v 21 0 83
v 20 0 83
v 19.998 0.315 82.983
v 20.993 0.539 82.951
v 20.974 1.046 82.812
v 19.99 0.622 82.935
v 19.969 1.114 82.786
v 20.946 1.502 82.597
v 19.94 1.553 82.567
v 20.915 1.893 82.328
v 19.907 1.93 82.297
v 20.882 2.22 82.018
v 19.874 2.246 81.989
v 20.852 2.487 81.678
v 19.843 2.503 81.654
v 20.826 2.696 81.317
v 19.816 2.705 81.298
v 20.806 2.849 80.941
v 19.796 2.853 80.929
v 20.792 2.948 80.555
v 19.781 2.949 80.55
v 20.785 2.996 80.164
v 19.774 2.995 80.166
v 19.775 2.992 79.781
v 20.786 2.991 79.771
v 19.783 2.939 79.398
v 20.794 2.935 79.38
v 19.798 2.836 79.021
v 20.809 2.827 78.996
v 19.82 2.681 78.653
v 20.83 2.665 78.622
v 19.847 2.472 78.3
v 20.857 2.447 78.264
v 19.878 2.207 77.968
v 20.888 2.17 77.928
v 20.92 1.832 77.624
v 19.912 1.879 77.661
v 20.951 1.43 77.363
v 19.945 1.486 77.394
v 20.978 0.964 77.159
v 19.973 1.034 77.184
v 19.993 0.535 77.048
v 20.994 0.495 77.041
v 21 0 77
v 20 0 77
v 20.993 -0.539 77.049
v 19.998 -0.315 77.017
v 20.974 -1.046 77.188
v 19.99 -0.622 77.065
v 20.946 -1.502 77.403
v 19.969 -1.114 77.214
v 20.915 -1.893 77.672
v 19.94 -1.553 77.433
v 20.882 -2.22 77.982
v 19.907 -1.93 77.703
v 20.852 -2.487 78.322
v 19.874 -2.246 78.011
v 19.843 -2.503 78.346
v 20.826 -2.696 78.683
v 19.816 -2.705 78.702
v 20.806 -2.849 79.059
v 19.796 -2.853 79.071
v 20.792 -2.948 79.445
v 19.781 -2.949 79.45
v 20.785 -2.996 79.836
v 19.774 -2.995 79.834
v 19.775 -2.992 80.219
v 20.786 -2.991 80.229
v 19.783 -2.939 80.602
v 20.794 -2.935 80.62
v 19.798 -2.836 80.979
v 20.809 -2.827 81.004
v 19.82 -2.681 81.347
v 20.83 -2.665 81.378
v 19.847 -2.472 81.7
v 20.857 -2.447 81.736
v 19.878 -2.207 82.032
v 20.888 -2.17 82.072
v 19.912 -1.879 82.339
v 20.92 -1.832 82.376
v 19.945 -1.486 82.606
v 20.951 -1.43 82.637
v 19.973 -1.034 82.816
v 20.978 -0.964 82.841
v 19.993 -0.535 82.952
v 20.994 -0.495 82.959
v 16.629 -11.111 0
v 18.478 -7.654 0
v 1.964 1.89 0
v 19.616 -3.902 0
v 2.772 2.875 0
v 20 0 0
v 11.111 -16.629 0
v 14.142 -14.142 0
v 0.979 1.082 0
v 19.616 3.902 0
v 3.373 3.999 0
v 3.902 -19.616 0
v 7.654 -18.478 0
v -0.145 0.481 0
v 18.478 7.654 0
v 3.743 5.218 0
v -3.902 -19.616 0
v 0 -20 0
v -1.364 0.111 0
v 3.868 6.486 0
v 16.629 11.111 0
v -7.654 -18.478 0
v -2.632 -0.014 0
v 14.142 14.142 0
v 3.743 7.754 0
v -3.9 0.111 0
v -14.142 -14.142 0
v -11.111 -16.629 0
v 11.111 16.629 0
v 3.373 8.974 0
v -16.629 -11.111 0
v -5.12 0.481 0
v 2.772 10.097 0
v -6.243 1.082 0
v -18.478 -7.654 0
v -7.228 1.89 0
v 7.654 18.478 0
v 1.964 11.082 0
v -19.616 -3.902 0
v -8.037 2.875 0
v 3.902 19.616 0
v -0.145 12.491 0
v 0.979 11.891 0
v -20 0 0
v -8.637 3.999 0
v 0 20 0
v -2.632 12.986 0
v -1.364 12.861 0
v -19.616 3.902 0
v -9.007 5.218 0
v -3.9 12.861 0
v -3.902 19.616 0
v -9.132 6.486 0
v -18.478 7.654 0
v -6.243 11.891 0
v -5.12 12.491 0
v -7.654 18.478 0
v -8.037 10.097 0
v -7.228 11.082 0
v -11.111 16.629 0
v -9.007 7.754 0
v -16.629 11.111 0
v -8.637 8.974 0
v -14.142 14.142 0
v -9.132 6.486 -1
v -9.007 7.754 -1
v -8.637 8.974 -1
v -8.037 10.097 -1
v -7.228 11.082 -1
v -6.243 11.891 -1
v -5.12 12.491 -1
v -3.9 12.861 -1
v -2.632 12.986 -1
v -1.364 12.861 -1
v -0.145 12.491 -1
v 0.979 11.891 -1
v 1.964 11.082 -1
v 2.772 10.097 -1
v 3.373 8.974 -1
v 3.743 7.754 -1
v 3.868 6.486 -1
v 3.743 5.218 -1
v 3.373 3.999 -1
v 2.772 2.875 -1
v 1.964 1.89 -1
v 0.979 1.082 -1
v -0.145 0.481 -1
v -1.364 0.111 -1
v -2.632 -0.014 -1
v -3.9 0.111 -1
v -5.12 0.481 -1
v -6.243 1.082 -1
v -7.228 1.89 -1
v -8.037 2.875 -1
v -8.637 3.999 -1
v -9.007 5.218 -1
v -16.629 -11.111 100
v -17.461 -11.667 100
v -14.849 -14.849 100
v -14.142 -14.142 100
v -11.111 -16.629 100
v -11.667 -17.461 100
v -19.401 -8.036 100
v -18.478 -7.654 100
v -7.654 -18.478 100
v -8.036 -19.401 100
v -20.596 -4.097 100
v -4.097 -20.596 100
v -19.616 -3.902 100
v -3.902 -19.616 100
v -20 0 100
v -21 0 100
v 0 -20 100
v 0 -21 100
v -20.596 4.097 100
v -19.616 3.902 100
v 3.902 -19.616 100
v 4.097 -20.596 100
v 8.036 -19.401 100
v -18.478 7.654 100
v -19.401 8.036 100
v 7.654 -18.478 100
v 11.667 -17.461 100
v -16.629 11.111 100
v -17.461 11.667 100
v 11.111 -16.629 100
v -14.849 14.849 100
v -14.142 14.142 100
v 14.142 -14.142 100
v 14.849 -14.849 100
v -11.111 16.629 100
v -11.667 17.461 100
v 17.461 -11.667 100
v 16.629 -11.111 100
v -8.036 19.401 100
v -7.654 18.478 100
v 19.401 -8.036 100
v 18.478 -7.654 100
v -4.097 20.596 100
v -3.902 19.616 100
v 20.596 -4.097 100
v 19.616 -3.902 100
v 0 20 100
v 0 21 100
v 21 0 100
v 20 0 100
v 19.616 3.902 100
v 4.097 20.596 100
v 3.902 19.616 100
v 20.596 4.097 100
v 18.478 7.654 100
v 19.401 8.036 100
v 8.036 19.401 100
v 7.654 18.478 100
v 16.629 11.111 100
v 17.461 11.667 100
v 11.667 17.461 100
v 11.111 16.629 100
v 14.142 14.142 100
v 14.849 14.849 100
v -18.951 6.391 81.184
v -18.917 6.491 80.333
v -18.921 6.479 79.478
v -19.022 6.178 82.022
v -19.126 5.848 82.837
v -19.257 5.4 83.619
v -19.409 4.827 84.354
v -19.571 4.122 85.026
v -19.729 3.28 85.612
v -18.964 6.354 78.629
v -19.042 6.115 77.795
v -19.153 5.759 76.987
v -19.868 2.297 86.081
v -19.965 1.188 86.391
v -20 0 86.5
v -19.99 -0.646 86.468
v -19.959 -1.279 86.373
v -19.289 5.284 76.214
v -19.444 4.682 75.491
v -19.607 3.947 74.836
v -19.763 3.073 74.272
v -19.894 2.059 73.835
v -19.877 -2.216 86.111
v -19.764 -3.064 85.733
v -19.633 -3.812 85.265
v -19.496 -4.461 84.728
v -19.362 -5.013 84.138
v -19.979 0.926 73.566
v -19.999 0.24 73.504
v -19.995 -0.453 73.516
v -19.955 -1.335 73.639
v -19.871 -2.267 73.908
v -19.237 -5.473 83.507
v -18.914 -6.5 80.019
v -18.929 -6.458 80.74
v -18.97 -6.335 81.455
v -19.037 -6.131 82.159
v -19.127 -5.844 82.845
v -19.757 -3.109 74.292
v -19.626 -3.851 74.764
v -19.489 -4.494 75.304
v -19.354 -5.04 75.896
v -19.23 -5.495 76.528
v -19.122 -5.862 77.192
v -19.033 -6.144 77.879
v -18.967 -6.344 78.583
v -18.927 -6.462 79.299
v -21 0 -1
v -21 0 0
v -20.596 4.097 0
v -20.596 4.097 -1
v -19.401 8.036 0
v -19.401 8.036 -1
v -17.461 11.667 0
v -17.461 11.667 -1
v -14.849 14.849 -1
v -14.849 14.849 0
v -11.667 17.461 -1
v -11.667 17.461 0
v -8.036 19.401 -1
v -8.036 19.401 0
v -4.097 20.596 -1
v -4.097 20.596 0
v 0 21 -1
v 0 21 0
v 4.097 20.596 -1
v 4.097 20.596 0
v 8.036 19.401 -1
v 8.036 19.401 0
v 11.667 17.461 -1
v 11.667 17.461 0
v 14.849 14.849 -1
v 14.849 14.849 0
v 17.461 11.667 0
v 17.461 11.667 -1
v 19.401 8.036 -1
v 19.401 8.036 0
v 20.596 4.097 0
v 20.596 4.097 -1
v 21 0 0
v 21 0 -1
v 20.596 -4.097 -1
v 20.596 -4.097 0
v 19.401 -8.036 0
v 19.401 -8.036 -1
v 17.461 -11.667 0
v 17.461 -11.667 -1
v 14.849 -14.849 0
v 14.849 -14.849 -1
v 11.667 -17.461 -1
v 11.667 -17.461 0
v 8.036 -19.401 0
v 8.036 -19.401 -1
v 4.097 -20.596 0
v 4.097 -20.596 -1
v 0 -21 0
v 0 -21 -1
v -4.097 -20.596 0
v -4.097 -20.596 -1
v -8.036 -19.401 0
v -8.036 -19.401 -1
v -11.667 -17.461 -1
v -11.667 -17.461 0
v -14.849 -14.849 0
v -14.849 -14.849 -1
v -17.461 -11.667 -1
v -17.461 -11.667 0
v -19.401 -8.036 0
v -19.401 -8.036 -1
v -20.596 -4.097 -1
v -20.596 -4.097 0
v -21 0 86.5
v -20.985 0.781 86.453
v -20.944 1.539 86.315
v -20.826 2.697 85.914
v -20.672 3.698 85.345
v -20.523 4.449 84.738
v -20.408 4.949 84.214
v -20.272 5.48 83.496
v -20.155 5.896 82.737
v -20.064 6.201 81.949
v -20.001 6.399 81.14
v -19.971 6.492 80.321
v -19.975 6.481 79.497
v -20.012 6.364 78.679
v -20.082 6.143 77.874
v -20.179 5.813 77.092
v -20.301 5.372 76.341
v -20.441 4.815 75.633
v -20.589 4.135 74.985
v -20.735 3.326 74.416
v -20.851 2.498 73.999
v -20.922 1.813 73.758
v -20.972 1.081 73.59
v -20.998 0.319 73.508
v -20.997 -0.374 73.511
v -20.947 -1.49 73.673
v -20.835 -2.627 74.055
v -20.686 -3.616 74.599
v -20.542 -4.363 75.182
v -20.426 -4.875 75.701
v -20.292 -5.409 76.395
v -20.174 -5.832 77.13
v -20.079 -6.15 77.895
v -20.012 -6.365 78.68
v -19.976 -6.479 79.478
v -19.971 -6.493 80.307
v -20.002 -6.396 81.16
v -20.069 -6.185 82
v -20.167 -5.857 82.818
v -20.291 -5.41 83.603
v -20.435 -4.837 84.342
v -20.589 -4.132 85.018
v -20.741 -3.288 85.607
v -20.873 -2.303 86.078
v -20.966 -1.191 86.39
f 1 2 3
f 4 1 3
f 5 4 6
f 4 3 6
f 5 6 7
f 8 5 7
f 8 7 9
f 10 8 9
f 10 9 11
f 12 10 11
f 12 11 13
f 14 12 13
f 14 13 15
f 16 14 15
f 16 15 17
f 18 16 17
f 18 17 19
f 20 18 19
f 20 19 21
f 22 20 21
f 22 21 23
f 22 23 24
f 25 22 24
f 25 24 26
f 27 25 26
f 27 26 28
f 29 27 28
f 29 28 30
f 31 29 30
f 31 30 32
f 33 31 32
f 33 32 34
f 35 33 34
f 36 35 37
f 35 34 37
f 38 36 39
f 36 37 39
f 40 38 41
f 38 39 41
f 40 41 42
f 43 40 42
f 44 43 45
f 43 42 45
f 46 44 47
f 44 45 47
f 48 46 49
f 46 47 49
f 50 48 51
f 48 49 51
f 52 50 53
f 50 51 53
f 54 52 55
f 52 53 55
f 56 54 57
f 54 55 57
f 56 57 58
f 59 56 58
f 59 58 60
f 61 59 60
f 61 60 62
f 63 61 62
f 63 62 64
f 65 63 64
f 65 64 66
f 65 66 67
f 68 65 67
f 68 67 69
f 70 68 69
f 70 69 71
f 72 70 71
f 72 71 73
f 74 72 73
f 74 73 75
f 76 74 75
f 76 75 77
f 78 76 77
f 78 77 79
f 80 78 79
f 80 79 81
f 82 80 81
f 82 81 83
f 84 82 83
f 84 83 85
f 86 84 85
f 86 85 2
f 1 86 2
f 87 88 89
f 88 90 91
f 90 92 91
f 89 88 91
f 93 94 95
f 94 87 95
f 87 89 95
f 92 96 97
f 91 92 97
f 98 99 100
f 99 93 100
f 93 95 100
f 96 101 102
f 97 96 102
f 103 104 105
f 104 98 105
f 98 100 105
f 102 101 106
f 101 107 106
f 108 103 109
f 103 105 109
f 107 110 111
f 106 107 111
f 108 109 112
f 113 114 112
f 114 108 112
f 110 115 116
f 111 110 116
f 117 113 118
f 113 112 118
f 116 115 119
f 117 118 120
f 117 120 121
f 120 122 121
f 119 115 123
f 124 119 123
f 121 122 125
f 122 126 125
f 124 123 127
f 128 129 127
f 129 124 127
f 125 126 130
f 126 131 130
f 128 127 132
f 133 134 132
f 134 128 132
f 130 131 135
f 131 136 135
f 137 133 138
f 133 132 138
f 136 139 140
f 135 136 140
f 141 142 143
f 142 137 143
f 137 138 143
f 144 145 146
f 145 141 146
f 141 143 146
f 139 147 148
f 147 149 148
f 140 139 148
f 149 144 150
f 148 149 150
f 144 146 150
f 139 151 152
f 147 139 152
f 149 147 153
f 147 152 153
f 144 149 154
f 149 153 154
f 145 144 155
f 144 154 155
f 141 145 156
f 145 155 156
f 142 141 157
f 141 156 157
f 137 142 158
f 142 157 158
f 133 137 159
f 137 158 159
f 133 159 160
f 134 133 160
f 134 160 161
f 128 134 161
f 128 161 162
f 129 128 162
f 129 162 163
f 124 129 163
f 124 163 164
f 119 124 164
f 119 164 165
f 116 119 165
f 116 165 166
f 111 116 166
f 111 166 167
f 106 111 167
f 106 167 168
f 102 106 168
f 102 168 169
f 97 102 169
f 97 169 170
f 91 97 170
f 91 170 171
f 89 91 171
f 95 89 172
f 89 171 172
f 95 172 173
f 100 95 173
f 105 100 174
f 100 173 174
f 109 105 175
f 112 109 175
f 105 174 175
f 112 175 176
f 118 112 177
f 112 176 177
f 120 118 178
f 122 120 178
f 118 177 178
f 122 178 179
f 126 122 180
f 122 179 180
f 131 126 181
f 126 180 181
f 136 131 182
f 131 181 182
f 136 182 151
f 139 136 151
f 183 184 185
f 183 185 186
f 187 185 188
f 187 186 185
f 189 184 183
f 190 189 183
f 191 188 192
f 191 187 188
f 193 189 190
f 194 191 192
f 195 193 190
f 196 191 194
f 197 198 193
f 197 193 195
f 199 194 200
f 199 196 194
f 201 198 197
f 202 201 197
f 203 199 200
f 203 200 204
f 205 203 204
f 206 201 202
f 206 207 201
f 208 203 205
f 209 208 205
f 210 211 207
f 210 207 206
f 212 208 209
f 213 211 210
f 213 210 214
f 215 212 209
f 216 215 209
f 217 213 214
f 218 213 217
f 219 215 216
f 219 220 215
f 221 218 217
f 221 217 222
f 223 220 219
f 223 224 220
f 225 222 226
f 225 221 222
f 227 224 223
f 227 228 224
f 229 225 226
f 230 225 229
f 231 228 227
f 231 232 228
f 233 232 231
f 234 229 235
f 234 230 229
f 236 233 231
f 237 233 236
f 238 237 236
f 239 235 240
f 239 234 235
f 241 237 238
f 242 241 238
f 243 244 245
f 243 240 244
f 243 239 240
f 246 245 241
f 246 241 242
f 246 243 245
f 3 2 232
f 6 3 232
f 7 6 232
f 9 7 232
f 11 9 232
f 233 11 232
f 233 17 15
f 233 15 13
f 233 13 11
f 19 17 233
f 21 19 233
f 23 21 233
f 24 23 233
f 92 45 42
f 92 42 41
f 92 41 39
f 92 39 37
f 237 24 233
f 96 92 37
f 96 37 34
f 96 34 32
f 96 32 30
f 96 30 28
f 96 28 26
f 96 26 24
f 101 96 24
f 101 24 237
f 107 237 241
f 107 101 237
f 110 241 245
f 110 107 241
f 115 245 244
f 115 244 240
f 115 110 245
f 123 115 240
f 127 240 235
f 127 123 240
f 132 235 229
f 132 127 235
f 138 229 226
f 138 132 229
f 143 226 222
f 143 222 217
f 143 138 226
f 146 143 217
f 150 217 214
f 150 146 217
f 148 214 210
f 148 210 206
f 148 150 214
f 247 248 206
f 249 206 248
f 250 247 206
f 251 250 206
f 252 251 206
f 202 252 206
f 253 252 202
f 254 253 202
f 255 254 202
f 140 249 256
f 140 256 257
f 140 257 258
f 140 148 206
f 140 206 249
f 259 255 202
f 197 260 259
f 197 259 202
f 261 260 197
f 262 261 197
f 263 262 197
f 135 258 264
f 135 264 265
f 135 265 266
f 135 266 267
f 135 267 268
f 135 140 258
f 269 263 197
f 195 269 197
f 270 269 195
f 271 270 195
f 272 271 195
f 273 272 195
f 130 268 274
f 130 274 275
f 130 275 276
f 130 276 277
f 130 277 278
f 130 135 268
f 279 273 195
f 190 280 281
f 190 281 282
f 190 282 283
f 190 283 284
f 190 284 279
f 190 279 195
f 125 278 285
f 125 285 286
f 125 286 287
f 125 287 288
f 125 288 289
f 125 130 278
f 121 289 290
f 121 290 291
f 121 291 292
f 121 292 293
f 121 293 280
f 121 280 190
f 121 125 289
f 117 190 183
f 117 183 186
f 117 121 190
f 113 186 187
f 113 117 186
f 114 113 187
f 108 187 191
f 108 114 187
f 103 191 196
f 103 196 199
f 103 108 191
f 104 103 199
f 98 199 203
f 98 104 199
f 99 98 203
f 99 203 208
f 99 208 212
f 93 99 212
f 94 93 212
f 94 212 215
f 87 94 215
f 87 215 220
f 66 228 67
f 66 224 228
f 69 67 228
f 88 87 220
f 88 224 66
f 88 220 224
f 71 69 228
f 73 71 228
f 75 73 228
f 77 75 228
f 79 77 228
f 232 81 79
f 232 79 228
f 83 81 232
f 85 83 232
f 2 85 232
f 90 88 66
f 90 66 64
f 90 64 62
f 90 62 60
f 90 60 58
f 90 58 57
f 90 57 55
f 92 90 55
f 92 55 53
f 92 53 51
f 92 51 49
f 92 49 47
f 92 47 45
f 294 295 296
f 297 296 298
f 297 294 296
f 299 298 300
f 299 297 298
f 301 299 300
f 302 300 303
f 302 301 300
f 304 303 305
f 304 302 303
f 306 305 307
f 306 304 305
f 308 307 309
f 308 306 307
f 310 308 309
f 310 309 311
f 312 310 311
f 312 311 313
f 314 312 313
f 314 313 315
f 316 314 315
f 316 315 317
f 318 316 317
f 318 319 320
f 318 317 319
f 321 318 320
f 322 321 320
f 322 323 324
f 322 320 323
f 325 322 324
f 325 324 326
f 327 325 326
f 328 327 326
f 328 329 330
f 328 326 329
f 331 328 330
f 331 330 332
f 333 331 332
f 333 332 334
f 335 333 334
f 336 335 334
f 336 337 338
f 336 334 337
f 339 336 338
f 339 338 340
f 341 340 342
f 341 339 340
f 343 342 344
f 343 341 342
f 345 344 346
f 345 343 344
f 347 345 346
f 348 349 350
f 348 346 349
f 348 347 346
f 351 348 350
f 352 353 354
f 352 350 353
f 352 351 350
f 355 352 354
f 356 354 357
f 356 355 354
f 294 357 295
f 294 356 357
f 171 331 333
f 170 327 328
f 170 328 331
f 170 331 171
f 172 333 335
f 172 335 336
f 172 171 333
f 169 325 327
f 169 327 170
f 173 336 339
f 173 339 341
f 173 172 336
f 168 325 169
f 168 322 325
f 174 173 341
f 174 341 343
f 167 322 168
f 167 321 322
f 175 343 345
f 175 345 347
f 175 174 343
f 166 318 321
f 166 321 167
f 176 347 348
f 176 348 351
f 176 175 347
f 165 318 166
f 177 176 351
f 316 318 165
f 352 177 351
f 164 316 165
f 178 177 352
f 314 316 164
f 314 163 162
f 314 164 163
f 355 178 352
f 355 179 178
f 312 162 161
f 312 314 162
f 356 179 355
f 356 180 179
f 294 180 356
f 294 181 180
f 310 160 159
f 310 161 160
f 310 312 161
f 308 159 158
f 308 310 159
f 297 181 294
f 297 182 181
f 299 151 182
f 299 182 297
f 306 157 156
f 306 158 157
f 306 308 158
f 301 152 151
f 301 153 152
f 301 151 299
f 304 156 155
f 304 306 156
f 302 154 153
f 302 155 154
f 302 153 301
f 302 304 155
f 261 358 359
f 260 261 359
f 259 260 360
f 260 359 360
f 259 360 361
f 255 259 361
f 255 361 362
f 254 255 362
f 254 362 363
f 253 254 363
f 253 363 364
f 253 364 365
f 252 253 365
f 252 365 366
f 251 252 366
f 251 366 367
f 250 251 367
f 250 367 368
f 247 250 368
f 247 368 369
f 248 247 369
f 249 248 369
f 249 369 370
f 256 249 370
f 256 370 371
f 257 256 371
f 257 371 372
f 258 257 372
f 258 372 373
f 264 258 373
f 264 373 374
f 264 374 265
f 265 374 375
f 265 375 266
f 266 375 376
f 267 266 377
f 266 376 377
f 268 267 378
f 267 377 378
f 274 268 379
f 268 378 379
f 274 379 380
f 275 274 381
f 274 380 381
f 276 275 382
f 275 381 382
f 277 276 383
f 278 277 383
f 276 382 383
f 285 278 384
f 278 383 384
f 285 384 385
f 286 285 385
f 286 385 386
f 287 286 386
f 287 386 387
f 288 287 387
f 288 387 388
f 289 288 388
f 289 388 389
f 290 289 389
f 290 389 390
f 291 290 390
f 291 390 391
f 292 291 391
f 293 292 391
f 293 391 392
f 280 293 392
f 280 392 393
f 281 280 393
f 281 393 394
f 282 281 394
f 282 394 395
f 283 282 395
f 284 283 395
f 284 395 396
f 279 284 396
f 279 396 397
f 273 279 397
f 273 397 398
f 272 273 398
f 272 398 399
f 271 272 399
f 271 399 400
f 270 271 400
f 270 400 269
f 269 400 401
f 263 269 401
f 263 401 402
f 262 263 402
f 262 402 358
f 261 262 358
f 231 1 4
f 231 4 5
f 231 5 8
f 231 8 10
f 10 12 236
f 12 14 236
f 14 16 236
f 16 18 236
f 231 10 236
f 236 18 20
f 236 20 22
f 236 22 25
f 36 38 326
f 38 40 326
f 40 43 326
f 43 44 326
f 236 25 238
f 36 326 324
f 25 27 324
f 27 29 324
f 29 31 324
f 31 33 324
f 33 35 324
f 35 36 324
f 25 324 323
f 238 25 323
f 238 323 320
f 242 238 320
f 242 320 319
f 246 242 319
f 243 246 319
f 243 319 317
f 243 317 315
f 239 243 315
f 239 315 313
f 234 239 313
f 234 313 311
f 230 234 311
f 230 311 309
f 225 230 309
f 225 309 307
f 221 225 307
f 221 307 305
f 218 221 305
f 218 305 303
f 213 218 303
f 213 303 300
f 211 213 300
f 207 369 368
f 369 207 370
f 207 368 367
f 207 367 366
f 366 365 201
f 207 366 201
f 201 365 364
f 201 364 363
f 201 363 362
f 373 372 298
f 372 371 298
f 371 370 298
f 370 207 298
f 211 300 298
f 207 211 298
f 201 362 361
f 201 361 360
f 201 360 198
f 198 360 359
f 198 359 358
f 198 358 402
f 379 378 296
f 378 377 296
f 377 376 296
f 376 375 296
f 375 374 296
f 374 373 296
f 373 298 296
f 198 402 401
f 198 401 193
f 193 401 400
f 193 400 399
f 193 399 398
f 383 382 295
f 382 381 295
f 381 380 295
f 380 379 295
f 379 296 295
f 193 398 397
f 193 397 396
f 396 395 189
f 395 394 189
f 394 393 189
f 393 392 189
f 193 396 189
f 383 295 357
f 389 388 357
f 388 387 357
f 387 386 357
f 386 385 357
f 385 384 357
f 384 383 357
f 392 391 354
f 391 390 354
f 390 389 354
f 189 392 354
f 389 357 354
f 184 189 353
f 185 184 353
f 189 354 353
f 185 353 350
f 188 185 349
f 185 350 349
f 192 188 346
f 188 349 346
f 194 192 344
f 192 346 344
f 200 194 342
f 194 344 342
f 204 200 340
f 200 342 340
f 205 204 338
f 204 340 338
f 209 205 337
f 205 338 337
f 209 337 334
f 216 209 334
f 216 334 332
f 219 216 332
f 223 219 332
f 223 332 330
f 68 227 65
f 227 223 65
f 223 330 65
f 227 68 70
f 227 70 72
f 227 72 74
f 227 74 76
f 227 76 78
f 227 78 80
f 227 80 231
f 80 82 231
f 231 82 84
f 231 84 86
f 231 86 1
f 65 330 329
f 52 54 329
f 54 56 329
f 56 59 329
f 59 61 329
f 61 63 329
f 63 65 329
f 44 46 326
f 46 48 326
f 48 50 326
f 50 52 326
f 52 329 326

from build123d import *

# Parameters (mm, degrees)
SKETCH1_R               = 21
SKETCH1_R_2             = 20
BOSS_EXTRUDE1_DEPTH     = 100
CUT_EXTRUDE1_REACH      = 112.476
CUT_EXTRUDE1_END_RADIUS = 20
SKETCH2_R               = 6.5
CUT_EXTRUDE3_REACH      = 112.476
SKETCH5_R               = 3
BOSS_EXTRUDE2_START     = 1
SKETCH3_R               = 21
BOSS_EXTRUDE2_DEPTH     = 1
CUT_EXTRUDE2_REACH      = 107.276
SKETCH4_R               = 6.5


with BuildPart() as part:
    # Sketch1 → Boss-Extrude1 (new body)
    with BuildSketch(Plane.XY):
        Circle(SKETCH1_R)
        Circle(SKETCH1_R_2, mode=Mode.SUBTRACT)
    extrude(amount=BOSS_EXTRUDE1_DEPTH)

    # Cut-Extrude1: up to this cylinder (the profile starts outside it)
    cut_extrude1_end = Plane(origin=(0, 0, 80), z_dir=(0, 0, -1)) * Cylinder(CUT_EXTRUDE1_END_RADIUS, 265.952, mode=Mode.PRIVATE)
    # Sketch2 → Cut-Extrude1 (cut, up to the surface)
    with BuildSketch(Plane.ZY.offset(21), mode=Mode.PRIVATE) as cut_extrude1_sk1:
        with Locations((80, 0)):
            Circle(SKETCH2_R)
    cut_extrude1_tool1 = extrude(cut_extrude1_sk1.sketch, amount=-CUT_EXTRUDE1_REACH, mode=Mode.PRIVATE) - cut_extrude1_end
    add(cut_extrude1_tool1.solids().sort_by_distance((-21, 0, 80))[0], mode=Mode.SUBTRACT)

    # Sketch5 → Cut-Extrude3 (cut, up to next)
    with BuildSketch(Plane.ZY.offset(21), mode=Mode.PRIVATE) as cut_extrude3_sk1:
        with Locations((80, 0)):
            Circle(SKETCH5_R)
    cut_extrude3_tool1 = extrude(cut_extrude3_sk1.sketch, amount=-CUT_EXTRUDE3_REACH, mode=Mode.PRIVATE) & part.part
    add(cut_extrude3_tool1.solids().sort_by_distance((-21, 0, 80))[0], mode=Mode.SUBTRACT)

    # Sketch3 → Boss-Extrude2 (add)
    with BuildSketch(Plane(origin=(0, 0, 0), x_dir=(-1, 0, 0), z_dir=(0, 0, -1)).offset(BOSS_EXTRUDE2_START)):
        Circle(SKETCH3_R)
    extrude(amount=-BOSS_EXTRUDE2_DEPTH)

    # Sketch4 → Cut-Extrude2 (cut, up to next)
    with BuildSketch(Plane(origin=(0, 0, -1), x_dir=(-1, 0, 0), z_dir=(0, 0, -1)), mode=Mode.PRIVATE) as cut_extrude2_sk1:
        with Locations((2.632276964, 6.486225249)):
            Circle(SKETCH4_R)
    cut_extrude2_tool1 = extrude(cut_extrude2_sk1.sketch, amount=-CUT_EXTRUDE2_REACH, mode=Mode.PRIVATE) & part.part
    add(cut_extrude2_tool1.solids().sort_by_distance((-2.632277, 6.486225, -1))[0], mode=Mode.SUBTRACT)


solid = part.part
